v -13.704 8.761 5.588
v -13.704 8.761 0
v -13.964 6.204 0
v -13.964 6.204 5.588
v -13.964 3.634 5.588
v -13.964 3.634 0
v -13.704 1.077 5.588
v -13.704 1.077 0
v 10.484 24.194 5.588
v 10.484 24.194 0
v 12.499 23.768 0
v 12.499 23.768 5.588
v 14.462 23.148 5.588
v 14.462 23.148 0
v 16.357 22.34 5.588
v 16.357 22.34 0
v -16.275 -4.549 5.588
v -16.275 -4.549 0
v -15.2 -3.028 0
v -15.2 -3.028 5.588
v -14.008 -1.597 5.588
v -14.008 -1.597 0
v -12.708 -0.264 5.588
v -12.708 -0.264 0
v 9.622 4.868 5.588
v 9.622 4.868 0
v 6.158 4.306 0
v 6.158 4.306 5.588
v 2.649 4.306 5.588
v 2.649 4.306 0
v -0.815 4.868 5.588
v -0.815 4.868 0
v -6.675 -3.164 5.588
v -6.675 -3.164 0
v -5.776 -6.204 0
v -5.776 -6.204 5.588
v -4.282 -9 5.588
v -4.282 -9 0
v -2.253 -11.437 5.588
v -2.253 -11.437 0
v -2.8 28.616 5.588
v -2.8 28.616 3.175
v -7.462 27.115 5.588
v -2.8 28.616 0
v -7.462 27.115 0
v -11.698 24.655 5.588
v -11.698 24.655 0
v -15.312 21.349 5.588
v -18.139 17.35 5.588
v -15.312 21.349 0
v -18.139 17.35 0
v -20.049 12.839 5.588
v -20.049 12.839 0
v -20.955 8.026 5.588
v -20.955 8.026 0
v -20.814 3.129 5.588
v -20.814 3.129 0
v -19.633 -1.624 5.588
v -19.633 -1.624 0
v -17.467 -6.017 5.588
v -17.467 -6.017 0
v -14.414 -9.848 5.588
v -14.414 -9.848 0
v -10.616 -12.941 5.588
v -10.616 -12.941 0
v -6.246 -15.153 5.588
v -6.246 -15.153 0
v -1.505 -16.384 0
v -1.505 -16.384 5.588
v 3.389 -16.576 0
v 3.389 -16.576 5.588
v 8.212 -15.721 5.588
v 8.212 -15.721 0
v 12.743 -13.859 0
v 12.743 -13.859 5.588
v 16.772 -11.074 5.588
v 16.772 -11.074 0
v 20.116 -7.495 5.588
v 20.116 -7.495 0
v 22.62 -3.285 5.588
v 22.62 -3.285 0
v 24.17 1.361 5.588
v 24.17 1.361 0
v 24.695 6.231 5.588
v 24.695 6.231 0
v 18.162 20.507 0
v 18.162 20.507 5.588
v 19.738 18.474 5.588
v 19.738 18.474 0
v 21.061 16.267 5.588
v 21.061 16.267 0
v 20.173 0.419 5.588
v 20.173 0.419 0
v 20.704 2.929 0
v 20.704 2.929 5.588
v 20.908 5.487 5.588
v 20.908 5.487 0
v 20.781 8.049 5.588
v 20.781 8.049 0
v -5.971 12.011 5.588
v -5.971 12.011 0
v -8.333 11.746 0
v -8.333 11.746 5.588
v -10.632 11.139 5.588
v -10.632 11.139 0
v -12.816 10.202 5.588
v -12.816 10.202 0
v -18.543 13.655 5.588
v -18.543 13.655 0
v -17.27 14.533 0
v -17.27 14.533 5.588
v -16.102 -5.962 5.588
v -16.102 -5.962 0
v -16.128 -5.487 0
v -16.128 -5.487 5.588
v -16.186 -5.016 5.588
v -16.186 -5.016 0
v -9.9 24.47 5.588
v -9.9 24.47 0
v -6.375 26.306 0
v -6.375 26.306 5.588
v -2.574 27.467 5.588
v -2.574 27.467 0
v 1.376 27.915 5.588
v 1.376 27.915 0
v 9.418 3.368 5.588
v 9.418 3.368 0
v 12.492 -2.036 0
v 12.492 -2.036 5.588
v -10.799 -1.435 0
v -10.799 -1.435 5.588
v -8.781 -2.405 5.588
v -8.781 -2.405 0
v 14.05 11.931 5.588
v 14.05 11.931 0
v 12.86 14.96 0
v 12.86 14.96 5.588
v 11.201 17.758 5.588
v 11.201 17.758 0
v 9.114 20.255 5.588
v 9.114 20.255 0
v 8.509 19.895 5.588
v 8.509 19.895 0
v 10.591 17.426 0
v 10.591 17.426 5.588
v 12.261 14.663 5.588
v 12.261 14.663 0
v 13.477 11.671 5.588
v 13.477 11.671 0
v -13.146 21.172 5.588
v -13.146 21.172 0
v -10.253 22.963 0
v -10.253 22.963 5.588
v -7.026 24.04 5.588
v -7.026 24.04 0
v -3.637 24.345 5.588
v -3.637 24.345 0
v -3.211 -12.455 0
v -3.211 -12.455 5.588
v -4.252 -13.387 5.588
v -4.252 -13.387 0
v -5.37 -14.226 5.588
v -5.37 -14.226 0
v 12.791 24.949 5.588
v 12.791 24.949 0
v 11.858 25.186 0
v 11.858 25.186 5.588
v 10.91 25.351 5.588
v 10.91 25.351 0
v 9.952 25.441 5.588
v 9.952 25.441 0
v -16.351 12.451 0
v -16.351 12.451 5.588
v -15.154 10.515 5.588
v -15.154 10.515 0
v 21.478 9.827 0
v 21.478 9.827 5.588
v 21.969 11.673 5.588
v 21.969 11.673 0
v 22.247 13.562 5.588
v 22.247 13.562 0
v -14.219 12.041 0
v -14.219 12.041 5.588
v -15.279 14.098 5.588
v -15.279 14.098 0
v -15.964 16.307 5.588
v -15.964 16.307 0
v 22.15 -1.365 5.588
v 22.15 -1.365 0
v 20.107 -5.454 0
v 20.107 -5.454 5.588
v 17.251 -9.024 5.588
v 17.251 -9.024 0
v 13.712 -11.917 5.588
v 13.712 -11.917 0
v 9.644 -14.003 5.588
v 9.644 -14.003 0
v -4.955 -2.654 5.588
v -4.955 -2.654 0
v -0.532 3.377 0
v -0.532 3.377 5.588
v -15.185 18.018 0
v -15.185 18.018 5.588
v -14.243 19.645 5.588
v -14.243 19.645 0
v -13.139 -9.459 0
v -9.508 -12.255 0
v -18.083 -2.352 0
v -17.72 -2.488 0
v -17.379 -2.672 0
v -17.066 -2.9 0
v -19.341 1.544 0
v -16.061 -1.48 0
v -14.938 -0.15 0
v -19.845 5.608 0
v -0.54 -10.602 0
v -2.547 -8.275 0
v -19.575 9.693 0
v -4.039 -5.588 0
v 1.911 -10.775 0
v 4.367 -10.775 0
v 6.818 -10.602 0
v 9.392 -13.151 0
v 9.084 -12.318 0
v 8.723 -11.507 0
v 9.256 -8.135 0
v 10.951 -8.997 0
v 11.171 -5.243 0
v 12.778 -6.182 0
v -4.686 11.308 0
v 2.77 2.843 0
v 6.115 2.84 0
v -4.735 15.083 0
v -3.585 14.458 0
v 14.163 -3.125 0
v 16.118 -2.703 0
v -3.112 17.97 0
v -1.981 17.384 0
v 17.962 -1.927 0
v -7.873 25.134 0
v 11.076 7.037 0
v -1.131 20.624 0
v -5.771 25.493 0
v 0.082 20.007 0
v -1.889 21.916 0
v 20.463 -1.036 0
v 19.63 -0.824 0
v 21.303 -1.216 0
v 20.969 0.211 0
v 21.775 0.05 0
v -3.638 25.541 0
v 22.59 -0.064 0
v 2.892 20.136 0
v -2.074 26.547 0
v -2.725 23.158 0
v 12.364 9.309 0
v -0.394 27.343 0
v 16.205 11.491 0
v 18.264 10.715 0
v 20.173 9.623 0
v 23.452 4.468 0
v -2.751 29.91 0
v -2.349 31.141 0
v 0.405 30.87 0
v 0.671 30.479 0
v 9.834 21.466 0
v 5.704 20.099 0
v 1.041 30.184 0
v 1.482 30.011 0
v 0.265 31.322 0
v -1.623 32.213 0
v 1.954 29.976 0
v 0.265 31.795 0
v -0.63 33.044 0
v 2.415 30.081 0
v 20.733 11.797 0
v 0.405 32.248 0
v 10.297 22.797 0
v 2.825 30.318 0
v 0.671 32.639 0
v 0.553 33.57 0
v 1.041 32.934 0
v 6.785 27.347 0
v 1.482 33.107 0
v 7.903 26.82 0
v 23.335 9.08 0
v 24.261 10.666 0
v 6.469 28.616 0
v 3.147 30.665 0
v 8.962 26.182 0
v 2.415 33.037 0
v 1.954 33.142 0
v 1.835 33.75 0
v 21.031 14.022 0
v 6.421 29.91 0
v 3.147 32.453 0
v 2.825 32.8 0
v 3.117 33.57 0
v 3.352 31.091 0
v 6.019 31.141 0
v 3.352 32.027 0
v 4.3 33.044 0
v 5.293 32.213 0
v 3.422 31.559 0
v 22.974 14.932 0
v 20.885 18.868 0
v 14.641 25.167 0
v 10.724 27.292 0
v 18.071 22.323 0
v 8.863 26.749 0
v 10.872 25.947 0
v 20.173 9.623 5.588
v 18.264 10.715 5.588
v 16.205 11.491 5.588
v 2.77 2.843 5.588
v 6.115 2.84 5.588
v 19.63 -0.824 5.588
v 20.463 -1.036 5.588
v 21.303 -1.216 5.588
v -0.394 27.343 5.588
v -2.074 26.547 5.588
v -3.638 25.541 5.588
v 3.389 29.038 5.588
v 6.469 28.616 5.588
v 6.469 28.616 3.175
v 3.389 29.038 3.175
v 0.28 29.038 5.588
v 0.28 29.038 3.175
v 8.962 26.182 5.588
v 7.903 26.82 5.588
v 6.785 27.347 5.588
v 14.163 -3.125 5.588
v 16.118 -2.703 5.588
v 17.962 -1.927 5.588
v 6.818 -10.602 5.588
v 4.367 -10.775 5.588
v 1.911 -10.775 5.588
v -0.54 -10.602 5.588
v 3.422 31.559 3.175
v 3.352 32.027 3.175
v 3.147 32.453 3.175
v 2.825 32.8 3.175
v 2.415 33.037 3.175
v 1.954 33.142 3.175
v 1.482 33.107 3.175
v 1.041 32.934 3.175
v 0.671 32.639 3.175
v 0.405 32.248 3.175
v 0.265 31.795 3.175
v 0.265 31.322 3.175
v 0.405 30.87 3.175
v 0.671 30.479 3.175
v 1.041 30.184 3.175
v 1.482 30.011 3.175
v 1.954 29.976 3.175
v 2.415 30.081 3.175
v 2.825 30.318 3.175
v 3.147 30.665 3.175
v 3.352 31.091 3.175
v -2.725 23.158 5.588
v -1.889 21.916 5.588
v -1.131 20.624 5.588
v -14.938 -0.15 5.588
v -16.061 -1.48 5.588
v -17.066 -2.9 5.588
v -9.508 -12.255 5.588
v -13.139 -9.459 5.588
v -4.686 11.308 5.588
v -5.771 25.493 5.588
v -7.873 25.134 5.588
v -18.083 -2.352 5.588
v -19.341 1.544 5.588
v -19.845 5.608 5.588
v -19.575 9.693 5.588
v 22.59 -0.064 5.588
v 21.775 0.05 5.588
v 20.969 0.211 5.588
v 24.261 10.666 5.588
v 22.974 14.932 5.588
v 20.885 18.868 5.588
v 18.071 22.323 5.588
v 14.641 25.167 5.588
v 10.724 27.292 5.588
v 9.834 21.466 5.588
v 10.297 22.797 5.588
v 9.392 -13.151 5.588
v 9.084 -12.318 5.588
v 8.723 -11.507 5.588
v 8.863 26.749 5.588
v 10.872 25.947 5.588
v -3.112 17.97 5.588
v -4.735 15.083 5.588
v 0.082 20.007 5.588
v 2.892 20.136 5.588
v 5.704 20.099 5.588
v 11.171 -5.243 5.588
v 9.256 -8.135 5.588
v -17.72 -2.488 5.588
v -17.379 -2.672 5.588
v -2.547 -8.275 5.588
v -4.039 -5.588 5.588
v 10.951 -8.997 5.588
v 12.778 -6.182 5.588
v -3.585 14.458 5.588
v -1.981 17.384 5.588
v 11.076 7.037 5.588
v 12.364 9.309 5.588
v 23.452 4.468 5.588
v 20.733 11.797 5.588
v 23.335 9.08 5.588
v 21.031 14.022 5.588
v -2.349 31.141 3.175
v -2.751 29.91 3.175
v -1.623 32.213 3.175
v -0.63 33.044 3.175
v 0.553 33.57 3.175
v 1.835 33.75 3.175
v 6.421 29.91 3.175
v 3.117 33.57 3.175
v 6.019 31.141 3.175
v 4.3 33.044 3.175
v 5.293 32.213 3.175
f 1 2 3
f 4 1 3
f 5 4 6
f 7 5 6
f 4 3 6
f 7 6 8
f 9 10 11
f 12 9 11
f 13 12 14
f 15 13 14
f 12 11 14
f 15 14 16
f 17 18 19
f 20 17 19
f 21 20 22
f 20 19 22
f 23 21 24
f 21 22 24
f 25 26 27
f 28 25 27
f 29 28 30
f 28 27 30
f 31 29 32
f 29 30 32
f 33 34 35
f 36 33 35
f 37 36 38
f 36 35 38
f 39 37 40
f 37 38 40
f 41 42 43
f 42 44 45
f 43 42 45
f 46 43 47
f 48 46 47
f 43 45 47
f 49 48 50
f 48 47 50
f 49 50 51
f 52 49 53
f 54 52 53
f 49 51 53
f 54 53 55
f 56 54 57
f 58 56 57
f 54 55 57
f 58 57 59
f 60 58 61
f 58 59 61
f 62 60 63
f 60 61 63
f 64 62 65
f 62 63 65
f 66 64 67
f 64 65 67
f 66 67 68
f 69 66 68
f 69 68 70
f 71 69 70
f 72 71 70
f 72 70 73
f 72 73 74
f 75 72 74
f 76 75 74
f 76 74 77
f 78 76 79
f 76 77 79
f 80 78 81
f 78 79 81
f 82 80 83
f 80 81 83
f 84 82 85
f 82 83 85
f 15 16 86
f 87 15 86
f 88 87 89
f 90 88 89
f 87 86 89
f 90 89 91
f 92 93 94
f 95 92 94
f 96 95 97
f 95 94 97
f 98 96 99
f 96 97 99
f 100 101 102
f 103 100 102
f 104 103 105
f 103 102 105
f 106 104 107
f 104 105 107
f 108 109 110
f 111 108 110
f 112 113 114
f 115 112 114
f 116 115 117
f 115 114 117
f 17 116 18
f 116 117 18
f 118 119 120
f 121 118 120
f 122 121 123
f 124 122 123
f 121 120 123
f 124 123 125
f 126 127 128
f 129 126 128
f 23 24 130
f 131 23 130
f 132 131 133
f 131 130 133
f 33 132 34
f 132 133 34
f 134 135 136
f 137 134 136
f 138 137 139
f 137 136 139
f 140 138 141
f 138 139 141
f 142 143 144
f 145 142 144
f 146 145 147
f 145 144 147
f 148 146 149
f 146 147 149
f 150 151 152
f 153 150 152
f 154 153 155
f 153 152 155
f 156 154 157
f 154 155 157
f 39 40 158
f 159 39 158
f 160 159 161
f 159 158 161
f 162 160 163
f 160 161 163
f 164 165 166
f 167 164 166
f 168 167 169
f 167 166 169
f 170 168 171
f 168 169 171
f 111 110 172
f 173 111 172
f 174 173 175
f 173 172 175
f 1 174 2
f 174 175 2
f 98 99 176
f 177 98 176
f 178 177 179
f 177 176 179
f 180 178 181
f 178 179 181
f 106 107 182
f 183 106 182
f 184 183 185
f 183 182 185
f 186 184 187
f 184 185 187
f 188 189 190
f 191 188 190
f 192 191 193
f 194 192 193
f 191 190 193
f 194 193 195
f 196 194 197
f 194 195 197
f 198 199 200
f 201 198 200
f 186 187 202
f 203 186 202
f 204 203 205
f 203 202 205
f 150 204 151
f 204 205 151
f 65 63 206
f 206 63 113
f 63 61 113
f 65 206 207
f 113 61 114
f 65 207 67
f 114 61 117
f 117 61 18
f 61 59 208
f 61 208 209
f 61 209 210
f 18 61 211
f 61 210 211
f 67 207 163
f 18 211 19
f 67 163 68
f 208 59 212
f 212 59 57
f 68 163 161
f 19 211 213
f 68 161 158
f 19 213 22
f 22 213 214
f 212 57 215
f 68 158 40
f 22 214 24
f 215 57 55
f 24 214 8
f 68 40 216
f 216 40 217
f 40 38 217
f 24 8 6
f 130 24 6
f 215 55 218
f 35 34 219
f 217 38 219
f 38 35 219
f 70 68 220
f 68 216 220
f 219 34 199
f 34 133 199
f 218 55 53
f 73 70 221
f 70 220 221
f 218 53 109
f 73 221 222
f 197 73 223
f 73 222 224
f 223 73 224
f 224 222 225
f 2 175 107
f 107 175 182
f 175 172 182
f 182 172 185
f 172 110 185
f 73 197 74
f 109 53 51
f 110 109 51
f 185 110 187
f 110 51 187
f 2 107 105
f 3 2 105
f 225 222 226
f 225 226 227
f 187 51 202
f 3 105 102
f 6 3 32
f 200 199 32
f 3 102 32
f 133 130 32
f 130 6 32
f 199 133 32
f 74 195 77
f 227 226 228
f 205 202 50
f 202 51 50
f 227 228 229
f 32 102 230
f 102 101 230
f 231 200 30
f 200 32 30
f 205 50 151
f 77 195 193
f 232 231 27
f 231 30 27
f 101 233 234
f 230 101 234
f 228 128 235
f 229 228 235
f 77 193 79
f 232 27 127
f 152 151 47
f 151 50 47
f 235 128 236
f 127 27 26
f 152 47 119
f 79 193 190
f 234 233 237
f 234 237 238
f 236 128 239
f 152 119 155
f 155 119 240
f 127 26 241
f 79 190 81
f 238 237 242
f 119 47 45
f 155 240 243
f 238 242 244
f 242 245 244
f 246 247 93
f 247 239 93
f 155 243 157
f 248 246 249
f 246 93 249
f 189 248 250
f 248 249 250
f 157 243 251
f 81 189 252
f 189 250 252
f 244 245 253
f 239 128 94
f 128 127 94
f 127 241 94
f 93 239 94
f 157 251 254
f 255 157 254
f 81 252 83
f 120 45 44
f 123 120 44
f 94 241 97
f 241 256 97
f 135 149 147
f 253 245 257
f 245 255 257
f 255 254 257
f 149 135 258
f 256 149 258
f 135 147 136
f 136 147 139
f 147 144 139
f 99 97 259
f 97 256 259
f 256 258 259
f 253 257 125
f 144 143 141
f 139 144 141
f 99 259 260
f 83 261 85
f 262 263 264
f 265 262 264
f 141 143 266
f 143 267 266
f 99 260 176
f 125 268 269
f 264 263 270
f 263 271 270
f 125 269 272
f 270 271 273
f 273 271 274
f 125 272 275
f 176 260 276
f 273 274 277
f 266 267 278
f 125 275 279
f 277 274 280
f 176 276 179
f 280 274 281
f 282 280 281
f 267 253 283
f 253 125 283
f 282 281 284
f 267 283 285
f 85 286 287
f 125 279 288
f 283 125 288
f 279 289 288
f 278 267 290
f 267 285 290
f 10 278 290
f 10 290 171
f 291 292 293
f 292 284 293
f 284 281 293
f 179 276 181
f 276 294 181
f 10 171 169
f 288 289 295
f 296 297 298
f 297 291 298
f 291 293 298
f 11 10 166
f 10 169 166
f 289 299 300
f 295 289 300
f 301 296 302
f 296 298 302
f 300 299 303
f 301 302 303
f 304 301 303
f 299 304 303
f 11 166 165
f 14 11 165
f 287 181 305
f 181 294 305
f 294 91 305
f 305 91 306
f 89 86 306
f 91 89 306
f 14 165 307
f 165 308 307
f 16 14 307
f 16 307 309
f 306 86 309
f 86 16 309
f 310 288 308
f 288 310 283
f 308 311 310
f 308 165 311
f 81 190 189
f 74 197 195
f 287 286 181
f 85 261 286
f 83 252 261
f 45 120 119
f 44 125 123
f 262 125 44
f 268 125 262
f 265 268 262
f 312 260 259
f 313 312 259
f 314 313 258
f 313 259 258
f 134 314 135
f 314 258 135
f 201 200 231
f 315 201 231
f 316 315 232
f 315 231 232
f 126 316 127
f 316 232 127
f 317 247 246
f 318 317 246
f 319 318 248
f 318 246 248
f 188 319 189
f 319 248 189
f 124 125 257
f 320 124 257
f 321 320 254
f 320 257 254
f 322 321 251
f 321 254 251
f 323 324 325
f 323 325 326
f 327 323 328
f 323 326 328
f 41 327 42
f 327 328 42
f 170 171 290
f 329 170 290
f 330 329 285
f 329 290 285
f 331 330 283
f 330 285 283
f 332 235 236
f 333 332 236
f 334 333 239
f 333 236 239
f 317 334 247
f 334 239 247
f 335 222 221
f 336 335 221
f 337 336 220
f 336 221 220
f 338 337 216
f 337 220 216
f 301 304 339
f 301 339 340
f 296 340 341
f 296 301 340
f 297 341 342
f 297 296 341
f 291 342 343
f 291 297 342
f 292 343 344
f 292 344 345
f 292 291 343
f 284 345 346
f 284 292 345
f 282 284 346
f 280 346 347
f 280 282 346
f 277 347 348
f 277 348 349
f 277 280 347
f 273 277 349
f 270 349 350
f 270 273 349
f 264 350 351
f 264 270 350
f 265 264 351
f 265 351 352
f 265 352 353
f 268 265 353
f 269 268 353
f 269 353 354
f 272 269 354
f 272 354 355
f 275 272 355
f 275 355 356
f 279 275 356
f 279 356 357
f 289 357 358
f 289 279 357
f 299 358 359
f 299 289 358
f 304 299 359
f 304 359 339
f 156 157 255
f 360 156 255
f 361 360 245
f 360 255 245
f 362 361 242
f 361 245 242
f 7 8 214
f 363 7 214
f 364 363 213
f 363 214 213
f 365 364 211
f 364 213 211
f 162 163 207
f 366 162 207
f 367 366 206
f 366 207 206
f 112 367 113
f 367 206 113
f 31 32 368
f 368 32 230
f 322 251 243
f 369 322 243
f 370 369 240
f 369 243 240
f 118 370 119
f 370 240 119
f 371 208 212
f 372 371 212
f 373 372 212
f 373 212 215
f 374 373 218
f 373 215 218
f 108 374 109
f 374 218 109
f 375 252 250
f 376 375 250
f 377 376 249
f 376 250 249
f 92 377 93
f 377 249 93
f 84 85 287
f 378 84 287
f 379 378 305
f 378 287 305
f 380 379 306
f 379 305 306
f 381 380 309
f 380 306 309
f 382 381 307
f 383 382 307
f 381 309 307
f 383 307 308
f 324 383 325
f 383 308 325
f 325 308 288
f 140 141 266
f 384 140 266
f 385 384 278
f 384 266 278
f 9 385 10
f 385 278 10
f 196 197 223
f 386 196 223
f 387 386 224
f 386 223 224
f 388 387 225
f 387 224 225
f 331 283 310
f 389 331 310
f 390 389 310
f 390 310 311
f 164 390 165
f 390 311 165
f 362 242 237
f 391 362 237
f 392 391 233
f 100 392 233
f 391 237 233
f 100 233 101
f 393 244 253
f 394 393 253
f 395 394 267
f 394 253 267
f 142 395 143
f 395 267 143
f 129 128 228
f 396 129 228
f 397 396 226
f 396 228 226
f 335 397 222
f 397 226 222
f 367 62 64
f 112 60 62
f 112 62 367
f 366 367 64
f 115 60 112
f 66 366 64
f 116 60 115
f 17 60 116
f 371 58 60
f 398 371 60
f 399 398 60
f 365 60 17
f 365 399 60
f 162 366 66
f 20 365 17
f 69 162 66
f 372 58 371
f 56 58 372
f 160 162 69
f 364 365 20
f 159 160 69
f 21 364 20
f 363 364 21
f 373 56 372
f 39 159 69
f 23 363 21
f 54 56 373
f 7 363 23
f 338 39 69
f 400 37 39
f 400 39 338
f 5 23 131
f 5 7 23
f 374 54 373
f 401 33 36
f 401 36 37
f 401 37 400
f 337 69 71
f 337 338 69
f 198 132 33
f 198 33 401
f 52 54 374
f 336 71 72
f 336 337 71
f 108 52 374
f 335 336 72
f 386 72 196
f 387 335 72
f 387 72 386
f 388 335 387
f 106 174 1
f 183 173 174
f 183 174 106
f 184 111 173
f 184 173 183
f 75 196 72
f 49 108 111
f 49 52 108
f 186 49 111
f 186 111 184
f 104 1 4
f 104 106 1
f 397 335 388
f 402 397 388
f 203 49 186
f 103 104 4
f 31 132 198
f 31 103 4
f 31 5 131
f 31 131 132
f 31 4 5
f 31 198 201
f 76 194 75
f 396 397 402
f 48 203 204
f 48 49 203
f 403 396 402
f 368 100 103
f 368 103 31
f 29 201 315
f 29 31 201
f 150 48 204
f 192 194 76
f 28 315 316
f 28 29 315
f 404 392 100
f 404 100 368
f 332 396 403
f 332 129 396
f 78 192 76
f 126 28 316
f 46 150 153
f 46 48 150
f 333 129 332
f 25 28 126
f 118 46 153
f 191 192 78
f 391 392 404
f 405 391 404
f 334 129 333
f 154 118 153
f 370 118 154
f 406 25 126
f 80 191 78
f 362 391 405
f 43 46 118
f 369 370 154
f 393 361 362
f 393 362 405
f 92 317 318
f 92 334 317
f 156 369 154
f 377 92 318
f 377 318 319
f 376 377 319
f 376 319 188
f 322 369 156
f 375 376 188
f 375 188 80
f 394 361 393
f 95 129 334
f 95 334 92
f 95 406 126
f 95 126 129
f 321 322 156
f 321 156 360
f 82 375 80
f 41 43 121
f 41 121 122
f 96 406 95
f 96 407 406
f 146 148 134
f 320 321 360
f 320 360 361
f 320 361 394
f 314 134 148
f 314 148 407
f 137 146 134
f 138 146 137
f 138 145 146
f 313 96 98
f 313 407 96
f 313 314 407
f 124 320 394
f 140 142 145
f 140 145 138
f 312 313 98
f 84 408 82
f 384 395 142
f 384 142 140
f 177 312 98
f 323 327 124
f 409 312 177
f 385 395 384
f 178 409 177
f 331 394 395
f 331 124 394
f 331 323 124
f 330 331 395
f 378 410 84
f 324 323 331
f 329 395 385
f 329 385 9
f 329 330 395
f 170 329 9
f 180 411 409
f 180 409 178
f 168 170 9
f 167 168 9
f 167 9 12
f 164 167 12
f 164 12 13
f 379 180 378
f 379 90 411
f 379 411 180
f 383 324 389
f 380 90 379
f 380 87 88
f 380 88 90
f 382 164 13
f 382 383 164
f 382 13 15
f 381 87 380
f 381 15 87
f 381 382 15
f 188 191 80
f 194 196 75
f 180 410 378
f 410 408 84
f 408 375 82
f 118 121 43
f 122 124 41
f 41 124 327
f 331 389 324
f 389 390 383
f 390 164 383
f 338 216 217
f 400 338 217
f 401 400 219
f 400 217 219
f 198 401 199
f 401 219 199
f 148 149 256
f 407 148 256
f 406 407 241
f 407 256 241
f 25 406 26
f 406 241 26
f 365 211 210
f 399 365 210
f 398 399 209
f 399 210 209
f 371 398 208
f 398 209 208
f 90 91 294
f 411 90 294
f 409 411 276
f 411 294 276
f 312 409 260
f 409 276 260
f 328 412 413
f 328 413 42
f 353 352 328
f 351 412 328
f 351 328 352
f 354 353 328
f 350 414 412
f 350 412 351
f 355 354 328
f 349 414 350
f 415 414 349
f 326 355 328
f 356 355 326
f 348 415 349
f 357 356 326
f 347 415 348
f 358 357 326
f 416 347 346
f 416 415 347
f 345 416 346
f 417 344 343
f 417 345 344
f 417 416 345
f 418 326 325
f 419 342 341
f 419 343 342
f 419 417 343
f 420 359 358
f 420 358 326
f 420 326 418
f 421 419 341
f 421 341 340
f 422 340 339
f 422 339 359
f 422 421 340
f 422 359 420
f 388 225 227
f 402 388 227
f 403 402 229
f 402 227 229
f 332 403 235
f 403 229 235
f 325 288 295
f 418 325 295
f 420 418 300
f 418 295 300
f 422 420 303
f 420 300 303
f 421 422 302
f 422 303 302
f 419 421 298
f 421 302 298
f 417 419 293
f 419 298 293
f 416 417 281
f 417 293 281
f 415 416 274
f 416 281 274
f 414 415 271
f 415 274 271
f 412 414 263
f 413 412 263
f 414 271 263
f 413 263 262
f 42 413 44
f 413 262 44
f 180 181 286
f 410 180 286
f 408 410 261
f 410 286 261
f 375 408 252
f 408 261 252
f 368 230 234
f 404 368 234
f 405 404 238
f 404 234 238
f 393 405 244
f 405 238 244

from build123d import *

# Parameters (mm, degrees)
F1_DEPTH = 5.588
F0_R     = 1.5875
F2_DEPTH = 3.175


with BuildPart() as f1:
    # F0 (on Top) → F1 (new body)
    with BuildSketch(Plane.XY):
        with BuildLine():
            ThreePointArc((-2.799588, 28.616356), (-12.598289, -11.49637), (24.694917, 6.231072))
            ThreePointArc((24.694917, 6.231072), (19.562358, 20.664277), (6.469421, 28.616356))
            ThreePointArc((6.469421, 28.616356), (1.834917, 29.091072), (-2.799588, 28.616356))
        make_face()
        with BuildLine():
            ThreePointArc((-5.369862, -14.225706), (-11.397518, -10.952969), (-16.101802, -5.961661))
            ThreePointArc((-16.101802, -5.961661), (-16.153461, -5.251027), (-16.274676, -4.548904))
            ThreePointArc((-16.274676, -4.548904), (-14.617901, -2.300976), (-12.707877, -0.263846))
            ThreePointArc((-12.707877, -0.263846), (-9.80272, -1.945343), (-6.675045, -3.163954))
            ThreePointArc((-6.675045, -3.163954), (-5.100362, -7.640459), (-2.253338, -11.436929))
            ThreePointArc((-2.253338, -11.436929), (-3.721621, -12.931872), (-5.369862, -14.225706))
        make_face(mode=Mode.SUBTRACT)
        with BuildLine():
            ThreePointArc((-18.082916, -2.351967), (-19.844564, 5.607587), (-18.543271, 13.655228))
            Line((-18.543271, 13.655228), (-17.270199, 14.533076))
            ThreePointArc((-17.270199, 14.533076), (-15.785824, 11.462826), (-13.704401, 8.76144))
            ThreePointArc((-13.704401, 8.76144), (-13.996186, 4.919357), (-13.704401, 1.077274))
            ThreePointArc((-13.704401, 1.077274), (-15.513504, -0.802895), (-17.065671, -2.900195))
            ThreePointArc((-17.065671, -2.900195), (-17.546558, -2.574616), (-18.082916, -2.351967))
        make_face(mode=Mode.SUBTRACT)
        with BuildLine():
            ThreePointArc((22.149822, -1.364534), (17.251466, -9.024046), (9.64394, -14.002755))
            ThreePointArc((9.64394, -14.002755), (9.244871, -12.732225), (8.723306, -11.50688))
            ThreePointArc((8.723306, -11.50688), (11.917547, -7.623779), (14.162866, -3.124869))
            ThreePointArc((14.162866, -3.124869), (17.057838, -2.357953), (19.630023, -0.824041))
            ThreePointArc((19.630023, -0.824041), (20.882224, -1.13018), (22.149822, -1.364534))
        make_face(mode=Mode.SUBTRACT)
        with BuildLine():
            ThreePointArc((-0.539564, -10.602418), (-3.361813, -6.969483), (-4.954739, -2.653711))
            Line((-4.954739, -2.653711), (-0.53185, 3.376688))
            ThreePointArc((-0.53185, 3.376688), (4.442387, 2.774831), (9.417674, 3.36794))
            Line((9.417674, 3.36794), (12.491665, -2.036115))
            ThreePointArc((12.491665, -2.036115), (10.283672, -6.735963), (6.817503, -10.602418))
            ThreePointArc((6.817503, -10.602418), (3.138969, -10.796056), (-0.539564, -10.602418))
        make_face(mode=Mode.SUBTRACT)
        with BuildLine():
            ThreePointArc((20.173145, 0.418834), (20.847319, 4.204631), (20.781009, 8.049416))
            ThreePointArc((20.781009, 8.049416), (21.749844, 10.743143), (22.246701, 13.562352))
            ThreePointArc((22.246701, 13.562352), (23.516492, 6.776863), (22.589715, -0.06392))
            ThreePointArc((22.589715, -0.06392), (21.370847, 0.124476), (20.173145, 0.418834))
        make_face(mode=Mode.SUBTRACT)
        with BuildLine():
            ThreePointArc((-15.963672, 16.307464), (-14.733515, 18.843029), (-13.14645, 21.171891))
            ThreePointArc((-13.14645, 21.171891), (-8.670762, 23.594902), (-3.63687, 24.345036))
            ThreePointArc((-3.63687, 24.345036), (-2.297105, 22.543175), (-1.13104, 20.62433))
            ThreePointArc((-1.13104, 20.62433), (-3.970215, 16.553071), (-5.971208, 12.010815))
            ThreePointArc((-5.971208, 12.010815), (-9.49366, 11.485055), (-12.815938, 10.20187))
            ThreePointArc((-12.815938, 10.20187), (-14.794346, 13.046106), (-15.963672, 16.307464))
        make_face(mode=Mode.SUBTRACT)
        with BuildLine():
            ThreePointArc((1.375797, 27.914656), (-1.246765, 26.971986), (-3.638193, 25.541065))
            ThreePointArc((-3.638193, 25.541065), (-6.82851, 25.352013), (-9.900401, 24.470341))
            ThreePointArc((-9.900401, 24.470341), (-4.500847, 26.973461), (1.375797, 27.914656))
        make_face(mode=Mode.SUBTRACT)
        with BuildLine():
            Line((-0.814806, 4.867908), (-4.685726, 11.308071))
            ThreePointArc((-4.685726, 11.308071), (-2.843515, 15.954202), (0.081828, 20.006689))
            ThreePointArc((0.081828, 20.006689), (4.298062, 20.138545), (8.50931, 19.894825))
            ThreePointArc((8.50931, 19.894825), (11.480397, 16.077327), (13.477047, 11.671189))
            ThreePointArc((13.477047, 11.671189), (11.741579, 8.160706), (9.621952, 4.867908))
            ThreePointArc((9.621952, 4.867908), (4.403573, 4.235942), (-0.814806, 4.867908))
        make_face(mode=Mode.SUBTRACT)
        with BuildLine():
            ThreePointArc((10.484066, 24.194032), (13.488074, 23.481635), (16.356681, 22.340291))
            ThreePointArc((16.356681, 22.340291), (18.980093, 19.513824), (21.061465, 16.267427))
            ThreePointArc((21.061465, 16.267427), (20.915004, 12.905343), (20.173145, 9.622858))
            ThreePointArc((20.173145, 9.622858), (17.24992, 11.144383), (14.049745, 11.931256))
            ThreePointArc((14.049745, 11.931256), (12.086703, 16.392472), (9.114349, 20.255255))
            ThreePointArc((9.114349, 20.255255), (10.099355, 22.120266), (10.484066, 24.194032))
        make_face(mode=Mode.SUBTRACT)
        with BuildLine():
            ThreePointArc((12.790839, 24.948881), (11.385585, 25.277937), (9.95159, 25.441265))
            ThreePointArc((9.95159, 25.441265), (8.440252, 26.514134), (6.784581, 27.347166))
            ThreePointArc((6.784581, 27.347166), (9.877607, 26.37316), (12.790839, 24.948881))
        make_face(mode=Mode.SUBTRACT)
    extrude(amount=F1_DEPTH)

    # F0 (on Top) → F2 (join)
    with BuildSketch(Plane.XY):
        with BuildLine():
            ThreePointArc((-2.799588, 28.616356), (1.834917, 29.091072), (6.469421, 28.616356))
            ThreePointArc((6.469421, 28.616356), (1.834917, 33.749825), (-2.799588, 28.616356))
        make_face()
        with Locations((1.834917, 31.558864)):
            Circle(F0_R, mode=Mode.SUBTRACT)
    extrude(amount=F2_DEPTH)


solid = f1.part
